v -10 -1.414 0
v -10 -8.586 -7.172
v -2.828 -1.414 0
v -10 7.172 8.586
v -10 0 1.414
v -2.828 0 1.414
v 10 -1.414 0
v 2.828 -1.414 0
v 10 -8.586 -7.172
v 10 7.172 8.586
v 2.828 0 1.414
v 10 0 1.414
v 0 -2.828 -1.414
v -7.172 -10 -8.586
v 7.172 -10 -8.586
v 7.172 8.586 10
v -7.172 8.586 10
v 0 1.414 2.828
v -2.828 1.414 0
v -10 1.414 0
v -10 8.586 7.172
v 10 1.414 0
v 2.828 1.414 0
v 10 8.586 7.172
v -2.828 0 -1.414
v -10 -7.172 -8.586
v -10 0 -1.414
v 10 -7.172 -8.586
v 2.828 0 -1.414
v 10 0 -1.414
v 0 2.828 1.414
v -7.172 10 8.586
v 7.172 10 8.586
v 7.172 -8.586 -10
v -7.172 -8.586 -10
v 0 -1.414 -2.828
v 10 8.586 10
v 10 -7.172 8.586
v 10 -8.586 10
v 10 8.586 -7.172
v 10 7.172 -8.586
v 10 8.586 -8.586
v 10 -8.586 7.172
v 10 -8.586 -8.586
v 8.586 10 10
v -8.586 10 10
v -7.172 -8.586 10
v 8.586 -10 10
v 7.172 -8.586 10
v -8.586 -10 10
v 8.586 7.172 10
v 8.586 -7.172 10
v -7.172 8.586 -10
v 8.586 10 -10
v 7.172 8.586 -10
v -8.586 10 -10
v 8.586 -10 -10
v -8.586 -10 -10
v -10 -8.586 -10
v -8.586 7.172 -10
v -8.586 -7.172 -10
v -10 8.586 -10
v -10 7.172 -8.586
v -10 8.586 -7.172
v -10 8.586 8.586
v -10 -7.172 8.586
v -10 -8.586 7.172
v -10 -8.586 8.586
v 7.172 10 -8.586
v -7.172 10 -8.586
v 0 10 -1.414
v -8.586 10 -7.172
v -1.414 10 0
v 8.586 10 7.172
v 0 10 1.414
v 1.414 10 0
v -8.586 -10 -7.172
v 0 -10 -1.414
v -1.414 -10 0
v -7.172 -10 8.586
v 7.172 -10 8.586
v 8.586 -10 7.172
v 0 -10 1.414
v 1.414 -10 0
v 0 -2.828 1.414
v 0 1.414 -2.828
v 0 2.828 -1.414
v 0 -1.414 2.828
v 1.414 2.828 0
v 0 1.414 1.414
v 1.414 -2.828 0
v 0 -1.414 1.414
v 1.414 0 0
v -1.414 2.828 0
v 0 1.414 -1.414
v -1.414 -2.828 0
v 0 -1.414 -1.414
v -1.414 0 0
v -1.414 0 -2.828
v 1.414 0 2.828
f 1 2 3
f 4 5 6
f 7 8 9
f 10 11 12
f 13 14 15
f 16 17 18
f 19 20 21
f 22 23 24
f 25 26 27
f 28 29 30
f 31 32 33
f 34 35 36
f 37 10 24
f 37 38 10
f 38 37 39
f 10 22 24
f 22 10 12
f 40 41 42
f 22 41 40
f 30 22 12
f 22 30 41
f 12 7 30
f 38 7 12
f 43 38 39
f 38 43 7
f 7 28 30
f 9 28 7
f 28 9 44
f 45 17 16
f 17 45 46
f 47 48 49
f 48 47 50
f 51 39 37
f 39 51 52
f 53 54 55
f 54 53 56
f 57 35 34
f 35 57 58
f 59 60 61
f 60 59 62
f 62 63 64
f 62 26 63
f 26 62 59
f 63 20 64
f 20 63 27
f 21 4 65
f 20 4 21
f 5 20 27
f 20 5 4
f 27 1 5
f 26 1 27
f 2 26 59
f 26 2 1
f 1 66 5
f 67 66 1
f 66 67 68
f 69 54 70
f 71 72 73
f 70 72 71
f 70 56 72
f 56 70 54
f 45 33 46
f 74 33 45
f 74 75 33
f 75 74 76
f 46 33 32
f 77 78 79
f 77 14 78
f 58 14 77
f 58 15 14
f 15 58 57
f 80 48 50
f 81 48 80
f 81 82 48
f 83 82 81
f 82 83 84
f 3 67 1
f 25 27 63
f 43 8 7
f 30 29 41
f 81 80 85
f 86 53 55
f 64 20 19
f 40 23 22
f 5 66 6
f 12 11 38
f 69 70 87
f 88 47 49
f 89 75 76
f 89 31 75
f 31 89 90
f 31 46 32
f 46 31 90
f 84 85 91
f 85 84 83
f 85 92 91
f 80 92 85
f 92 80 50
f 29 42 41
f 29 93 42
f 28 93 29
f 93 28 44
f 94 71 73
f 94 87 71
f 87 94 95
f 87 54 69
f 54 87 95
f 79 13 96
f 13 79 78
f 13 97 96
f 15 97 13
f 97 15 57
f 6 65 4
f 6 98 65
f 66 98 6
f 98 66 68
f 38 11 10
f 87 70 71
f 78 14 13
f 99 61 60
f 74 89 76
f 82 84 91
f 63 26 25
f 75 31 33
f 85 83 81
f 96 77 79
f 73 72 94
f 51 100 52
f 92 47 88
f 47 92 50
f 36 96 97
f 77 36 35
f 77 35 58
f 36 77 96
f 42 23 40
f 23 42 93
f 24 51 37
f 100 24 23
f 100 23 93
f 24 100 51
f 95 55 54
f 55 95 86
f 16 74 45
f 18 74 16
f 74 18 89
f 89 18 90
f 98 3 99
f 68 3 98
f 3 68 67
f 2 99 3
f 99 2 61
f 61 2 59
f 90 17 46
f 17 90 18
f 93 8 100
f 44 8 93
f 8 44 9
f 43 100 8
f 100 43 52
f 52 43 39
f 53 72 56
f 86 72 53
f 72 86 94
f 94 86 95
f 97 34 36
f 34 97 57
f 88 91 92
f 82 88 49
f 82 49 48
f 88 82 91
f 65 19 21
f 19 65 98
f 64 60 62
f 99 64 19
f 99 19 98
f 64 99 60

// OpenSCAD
cube_size=20; //Cube Dimensions in mm
plate_size=2; //Plate Thickness in mm
whole=3;
frag="YES";

module plate(XRotate,YRotate,cube_size,plate_width){
    intersection(){
        rotate([XRotate,YRotate,0]) cube([(2.5*cube_size),(2.5*cube_size),plate_width],center=true);
        cube(cube_size,center=true);
    }
}

if(frag=="YES"){
z=6-whole; 
difference(){
    union(){
    for(k=[1:z]){
        if(k==6) plate(45,90,cube_size,plate_size);
        if(k==5) rotate([0,0,90]) plate(45,90,cube_size,plate_size);
        if(k==4) plate(0,45,cube_size, plate_size);
        if(k==3) rotate([0,90,0]) plate(0,45,cube_size, plate_size);
        if(k==2) plate(45,0,cube_size,plate_size);
        if(k==1) rotate([90,0,0]) plate(45,0,cube_size,plate_size);
        }
    }
    union(){
    for (x=[1:whole]){
        if(x==1) plate(45,90,cube_size,plate_size);
        if(x==2) rotate([0,0,90]) plate(45,90,cube_size,plate_size);
        if(x==3) plate(0,45,cube_size, plate_size);
        if(x==4) rotate([0,90,0]) plate(0,45,cube_size, plate_size);
        if(x==5) plate(45,0,cube_size,plate_size);
        if(x==6) rotate([90,0,0]) plate(45,0,cube_size,plate_size);
        }
    }
}
}
else if(frag=="NO"){
    for (x=[1:whole]){
        if(x==1) plate(45,90,cube_size,plate_size);
        if(x==2) rotate([0,0,90]) plate(45,90,cube_size,plate_size);
        if(x==3) plate(0,45,cube_size, plate_size);
        if(x==4) rotate([0,90,0]) plate(0,45,cube_size, plate_size);
        if(x==5) plate(45,0,cube_size,plate_size);
        if(x==6) rotate([90,0,0]) plate(45,0,cube_size,plate_size);
    }
}
